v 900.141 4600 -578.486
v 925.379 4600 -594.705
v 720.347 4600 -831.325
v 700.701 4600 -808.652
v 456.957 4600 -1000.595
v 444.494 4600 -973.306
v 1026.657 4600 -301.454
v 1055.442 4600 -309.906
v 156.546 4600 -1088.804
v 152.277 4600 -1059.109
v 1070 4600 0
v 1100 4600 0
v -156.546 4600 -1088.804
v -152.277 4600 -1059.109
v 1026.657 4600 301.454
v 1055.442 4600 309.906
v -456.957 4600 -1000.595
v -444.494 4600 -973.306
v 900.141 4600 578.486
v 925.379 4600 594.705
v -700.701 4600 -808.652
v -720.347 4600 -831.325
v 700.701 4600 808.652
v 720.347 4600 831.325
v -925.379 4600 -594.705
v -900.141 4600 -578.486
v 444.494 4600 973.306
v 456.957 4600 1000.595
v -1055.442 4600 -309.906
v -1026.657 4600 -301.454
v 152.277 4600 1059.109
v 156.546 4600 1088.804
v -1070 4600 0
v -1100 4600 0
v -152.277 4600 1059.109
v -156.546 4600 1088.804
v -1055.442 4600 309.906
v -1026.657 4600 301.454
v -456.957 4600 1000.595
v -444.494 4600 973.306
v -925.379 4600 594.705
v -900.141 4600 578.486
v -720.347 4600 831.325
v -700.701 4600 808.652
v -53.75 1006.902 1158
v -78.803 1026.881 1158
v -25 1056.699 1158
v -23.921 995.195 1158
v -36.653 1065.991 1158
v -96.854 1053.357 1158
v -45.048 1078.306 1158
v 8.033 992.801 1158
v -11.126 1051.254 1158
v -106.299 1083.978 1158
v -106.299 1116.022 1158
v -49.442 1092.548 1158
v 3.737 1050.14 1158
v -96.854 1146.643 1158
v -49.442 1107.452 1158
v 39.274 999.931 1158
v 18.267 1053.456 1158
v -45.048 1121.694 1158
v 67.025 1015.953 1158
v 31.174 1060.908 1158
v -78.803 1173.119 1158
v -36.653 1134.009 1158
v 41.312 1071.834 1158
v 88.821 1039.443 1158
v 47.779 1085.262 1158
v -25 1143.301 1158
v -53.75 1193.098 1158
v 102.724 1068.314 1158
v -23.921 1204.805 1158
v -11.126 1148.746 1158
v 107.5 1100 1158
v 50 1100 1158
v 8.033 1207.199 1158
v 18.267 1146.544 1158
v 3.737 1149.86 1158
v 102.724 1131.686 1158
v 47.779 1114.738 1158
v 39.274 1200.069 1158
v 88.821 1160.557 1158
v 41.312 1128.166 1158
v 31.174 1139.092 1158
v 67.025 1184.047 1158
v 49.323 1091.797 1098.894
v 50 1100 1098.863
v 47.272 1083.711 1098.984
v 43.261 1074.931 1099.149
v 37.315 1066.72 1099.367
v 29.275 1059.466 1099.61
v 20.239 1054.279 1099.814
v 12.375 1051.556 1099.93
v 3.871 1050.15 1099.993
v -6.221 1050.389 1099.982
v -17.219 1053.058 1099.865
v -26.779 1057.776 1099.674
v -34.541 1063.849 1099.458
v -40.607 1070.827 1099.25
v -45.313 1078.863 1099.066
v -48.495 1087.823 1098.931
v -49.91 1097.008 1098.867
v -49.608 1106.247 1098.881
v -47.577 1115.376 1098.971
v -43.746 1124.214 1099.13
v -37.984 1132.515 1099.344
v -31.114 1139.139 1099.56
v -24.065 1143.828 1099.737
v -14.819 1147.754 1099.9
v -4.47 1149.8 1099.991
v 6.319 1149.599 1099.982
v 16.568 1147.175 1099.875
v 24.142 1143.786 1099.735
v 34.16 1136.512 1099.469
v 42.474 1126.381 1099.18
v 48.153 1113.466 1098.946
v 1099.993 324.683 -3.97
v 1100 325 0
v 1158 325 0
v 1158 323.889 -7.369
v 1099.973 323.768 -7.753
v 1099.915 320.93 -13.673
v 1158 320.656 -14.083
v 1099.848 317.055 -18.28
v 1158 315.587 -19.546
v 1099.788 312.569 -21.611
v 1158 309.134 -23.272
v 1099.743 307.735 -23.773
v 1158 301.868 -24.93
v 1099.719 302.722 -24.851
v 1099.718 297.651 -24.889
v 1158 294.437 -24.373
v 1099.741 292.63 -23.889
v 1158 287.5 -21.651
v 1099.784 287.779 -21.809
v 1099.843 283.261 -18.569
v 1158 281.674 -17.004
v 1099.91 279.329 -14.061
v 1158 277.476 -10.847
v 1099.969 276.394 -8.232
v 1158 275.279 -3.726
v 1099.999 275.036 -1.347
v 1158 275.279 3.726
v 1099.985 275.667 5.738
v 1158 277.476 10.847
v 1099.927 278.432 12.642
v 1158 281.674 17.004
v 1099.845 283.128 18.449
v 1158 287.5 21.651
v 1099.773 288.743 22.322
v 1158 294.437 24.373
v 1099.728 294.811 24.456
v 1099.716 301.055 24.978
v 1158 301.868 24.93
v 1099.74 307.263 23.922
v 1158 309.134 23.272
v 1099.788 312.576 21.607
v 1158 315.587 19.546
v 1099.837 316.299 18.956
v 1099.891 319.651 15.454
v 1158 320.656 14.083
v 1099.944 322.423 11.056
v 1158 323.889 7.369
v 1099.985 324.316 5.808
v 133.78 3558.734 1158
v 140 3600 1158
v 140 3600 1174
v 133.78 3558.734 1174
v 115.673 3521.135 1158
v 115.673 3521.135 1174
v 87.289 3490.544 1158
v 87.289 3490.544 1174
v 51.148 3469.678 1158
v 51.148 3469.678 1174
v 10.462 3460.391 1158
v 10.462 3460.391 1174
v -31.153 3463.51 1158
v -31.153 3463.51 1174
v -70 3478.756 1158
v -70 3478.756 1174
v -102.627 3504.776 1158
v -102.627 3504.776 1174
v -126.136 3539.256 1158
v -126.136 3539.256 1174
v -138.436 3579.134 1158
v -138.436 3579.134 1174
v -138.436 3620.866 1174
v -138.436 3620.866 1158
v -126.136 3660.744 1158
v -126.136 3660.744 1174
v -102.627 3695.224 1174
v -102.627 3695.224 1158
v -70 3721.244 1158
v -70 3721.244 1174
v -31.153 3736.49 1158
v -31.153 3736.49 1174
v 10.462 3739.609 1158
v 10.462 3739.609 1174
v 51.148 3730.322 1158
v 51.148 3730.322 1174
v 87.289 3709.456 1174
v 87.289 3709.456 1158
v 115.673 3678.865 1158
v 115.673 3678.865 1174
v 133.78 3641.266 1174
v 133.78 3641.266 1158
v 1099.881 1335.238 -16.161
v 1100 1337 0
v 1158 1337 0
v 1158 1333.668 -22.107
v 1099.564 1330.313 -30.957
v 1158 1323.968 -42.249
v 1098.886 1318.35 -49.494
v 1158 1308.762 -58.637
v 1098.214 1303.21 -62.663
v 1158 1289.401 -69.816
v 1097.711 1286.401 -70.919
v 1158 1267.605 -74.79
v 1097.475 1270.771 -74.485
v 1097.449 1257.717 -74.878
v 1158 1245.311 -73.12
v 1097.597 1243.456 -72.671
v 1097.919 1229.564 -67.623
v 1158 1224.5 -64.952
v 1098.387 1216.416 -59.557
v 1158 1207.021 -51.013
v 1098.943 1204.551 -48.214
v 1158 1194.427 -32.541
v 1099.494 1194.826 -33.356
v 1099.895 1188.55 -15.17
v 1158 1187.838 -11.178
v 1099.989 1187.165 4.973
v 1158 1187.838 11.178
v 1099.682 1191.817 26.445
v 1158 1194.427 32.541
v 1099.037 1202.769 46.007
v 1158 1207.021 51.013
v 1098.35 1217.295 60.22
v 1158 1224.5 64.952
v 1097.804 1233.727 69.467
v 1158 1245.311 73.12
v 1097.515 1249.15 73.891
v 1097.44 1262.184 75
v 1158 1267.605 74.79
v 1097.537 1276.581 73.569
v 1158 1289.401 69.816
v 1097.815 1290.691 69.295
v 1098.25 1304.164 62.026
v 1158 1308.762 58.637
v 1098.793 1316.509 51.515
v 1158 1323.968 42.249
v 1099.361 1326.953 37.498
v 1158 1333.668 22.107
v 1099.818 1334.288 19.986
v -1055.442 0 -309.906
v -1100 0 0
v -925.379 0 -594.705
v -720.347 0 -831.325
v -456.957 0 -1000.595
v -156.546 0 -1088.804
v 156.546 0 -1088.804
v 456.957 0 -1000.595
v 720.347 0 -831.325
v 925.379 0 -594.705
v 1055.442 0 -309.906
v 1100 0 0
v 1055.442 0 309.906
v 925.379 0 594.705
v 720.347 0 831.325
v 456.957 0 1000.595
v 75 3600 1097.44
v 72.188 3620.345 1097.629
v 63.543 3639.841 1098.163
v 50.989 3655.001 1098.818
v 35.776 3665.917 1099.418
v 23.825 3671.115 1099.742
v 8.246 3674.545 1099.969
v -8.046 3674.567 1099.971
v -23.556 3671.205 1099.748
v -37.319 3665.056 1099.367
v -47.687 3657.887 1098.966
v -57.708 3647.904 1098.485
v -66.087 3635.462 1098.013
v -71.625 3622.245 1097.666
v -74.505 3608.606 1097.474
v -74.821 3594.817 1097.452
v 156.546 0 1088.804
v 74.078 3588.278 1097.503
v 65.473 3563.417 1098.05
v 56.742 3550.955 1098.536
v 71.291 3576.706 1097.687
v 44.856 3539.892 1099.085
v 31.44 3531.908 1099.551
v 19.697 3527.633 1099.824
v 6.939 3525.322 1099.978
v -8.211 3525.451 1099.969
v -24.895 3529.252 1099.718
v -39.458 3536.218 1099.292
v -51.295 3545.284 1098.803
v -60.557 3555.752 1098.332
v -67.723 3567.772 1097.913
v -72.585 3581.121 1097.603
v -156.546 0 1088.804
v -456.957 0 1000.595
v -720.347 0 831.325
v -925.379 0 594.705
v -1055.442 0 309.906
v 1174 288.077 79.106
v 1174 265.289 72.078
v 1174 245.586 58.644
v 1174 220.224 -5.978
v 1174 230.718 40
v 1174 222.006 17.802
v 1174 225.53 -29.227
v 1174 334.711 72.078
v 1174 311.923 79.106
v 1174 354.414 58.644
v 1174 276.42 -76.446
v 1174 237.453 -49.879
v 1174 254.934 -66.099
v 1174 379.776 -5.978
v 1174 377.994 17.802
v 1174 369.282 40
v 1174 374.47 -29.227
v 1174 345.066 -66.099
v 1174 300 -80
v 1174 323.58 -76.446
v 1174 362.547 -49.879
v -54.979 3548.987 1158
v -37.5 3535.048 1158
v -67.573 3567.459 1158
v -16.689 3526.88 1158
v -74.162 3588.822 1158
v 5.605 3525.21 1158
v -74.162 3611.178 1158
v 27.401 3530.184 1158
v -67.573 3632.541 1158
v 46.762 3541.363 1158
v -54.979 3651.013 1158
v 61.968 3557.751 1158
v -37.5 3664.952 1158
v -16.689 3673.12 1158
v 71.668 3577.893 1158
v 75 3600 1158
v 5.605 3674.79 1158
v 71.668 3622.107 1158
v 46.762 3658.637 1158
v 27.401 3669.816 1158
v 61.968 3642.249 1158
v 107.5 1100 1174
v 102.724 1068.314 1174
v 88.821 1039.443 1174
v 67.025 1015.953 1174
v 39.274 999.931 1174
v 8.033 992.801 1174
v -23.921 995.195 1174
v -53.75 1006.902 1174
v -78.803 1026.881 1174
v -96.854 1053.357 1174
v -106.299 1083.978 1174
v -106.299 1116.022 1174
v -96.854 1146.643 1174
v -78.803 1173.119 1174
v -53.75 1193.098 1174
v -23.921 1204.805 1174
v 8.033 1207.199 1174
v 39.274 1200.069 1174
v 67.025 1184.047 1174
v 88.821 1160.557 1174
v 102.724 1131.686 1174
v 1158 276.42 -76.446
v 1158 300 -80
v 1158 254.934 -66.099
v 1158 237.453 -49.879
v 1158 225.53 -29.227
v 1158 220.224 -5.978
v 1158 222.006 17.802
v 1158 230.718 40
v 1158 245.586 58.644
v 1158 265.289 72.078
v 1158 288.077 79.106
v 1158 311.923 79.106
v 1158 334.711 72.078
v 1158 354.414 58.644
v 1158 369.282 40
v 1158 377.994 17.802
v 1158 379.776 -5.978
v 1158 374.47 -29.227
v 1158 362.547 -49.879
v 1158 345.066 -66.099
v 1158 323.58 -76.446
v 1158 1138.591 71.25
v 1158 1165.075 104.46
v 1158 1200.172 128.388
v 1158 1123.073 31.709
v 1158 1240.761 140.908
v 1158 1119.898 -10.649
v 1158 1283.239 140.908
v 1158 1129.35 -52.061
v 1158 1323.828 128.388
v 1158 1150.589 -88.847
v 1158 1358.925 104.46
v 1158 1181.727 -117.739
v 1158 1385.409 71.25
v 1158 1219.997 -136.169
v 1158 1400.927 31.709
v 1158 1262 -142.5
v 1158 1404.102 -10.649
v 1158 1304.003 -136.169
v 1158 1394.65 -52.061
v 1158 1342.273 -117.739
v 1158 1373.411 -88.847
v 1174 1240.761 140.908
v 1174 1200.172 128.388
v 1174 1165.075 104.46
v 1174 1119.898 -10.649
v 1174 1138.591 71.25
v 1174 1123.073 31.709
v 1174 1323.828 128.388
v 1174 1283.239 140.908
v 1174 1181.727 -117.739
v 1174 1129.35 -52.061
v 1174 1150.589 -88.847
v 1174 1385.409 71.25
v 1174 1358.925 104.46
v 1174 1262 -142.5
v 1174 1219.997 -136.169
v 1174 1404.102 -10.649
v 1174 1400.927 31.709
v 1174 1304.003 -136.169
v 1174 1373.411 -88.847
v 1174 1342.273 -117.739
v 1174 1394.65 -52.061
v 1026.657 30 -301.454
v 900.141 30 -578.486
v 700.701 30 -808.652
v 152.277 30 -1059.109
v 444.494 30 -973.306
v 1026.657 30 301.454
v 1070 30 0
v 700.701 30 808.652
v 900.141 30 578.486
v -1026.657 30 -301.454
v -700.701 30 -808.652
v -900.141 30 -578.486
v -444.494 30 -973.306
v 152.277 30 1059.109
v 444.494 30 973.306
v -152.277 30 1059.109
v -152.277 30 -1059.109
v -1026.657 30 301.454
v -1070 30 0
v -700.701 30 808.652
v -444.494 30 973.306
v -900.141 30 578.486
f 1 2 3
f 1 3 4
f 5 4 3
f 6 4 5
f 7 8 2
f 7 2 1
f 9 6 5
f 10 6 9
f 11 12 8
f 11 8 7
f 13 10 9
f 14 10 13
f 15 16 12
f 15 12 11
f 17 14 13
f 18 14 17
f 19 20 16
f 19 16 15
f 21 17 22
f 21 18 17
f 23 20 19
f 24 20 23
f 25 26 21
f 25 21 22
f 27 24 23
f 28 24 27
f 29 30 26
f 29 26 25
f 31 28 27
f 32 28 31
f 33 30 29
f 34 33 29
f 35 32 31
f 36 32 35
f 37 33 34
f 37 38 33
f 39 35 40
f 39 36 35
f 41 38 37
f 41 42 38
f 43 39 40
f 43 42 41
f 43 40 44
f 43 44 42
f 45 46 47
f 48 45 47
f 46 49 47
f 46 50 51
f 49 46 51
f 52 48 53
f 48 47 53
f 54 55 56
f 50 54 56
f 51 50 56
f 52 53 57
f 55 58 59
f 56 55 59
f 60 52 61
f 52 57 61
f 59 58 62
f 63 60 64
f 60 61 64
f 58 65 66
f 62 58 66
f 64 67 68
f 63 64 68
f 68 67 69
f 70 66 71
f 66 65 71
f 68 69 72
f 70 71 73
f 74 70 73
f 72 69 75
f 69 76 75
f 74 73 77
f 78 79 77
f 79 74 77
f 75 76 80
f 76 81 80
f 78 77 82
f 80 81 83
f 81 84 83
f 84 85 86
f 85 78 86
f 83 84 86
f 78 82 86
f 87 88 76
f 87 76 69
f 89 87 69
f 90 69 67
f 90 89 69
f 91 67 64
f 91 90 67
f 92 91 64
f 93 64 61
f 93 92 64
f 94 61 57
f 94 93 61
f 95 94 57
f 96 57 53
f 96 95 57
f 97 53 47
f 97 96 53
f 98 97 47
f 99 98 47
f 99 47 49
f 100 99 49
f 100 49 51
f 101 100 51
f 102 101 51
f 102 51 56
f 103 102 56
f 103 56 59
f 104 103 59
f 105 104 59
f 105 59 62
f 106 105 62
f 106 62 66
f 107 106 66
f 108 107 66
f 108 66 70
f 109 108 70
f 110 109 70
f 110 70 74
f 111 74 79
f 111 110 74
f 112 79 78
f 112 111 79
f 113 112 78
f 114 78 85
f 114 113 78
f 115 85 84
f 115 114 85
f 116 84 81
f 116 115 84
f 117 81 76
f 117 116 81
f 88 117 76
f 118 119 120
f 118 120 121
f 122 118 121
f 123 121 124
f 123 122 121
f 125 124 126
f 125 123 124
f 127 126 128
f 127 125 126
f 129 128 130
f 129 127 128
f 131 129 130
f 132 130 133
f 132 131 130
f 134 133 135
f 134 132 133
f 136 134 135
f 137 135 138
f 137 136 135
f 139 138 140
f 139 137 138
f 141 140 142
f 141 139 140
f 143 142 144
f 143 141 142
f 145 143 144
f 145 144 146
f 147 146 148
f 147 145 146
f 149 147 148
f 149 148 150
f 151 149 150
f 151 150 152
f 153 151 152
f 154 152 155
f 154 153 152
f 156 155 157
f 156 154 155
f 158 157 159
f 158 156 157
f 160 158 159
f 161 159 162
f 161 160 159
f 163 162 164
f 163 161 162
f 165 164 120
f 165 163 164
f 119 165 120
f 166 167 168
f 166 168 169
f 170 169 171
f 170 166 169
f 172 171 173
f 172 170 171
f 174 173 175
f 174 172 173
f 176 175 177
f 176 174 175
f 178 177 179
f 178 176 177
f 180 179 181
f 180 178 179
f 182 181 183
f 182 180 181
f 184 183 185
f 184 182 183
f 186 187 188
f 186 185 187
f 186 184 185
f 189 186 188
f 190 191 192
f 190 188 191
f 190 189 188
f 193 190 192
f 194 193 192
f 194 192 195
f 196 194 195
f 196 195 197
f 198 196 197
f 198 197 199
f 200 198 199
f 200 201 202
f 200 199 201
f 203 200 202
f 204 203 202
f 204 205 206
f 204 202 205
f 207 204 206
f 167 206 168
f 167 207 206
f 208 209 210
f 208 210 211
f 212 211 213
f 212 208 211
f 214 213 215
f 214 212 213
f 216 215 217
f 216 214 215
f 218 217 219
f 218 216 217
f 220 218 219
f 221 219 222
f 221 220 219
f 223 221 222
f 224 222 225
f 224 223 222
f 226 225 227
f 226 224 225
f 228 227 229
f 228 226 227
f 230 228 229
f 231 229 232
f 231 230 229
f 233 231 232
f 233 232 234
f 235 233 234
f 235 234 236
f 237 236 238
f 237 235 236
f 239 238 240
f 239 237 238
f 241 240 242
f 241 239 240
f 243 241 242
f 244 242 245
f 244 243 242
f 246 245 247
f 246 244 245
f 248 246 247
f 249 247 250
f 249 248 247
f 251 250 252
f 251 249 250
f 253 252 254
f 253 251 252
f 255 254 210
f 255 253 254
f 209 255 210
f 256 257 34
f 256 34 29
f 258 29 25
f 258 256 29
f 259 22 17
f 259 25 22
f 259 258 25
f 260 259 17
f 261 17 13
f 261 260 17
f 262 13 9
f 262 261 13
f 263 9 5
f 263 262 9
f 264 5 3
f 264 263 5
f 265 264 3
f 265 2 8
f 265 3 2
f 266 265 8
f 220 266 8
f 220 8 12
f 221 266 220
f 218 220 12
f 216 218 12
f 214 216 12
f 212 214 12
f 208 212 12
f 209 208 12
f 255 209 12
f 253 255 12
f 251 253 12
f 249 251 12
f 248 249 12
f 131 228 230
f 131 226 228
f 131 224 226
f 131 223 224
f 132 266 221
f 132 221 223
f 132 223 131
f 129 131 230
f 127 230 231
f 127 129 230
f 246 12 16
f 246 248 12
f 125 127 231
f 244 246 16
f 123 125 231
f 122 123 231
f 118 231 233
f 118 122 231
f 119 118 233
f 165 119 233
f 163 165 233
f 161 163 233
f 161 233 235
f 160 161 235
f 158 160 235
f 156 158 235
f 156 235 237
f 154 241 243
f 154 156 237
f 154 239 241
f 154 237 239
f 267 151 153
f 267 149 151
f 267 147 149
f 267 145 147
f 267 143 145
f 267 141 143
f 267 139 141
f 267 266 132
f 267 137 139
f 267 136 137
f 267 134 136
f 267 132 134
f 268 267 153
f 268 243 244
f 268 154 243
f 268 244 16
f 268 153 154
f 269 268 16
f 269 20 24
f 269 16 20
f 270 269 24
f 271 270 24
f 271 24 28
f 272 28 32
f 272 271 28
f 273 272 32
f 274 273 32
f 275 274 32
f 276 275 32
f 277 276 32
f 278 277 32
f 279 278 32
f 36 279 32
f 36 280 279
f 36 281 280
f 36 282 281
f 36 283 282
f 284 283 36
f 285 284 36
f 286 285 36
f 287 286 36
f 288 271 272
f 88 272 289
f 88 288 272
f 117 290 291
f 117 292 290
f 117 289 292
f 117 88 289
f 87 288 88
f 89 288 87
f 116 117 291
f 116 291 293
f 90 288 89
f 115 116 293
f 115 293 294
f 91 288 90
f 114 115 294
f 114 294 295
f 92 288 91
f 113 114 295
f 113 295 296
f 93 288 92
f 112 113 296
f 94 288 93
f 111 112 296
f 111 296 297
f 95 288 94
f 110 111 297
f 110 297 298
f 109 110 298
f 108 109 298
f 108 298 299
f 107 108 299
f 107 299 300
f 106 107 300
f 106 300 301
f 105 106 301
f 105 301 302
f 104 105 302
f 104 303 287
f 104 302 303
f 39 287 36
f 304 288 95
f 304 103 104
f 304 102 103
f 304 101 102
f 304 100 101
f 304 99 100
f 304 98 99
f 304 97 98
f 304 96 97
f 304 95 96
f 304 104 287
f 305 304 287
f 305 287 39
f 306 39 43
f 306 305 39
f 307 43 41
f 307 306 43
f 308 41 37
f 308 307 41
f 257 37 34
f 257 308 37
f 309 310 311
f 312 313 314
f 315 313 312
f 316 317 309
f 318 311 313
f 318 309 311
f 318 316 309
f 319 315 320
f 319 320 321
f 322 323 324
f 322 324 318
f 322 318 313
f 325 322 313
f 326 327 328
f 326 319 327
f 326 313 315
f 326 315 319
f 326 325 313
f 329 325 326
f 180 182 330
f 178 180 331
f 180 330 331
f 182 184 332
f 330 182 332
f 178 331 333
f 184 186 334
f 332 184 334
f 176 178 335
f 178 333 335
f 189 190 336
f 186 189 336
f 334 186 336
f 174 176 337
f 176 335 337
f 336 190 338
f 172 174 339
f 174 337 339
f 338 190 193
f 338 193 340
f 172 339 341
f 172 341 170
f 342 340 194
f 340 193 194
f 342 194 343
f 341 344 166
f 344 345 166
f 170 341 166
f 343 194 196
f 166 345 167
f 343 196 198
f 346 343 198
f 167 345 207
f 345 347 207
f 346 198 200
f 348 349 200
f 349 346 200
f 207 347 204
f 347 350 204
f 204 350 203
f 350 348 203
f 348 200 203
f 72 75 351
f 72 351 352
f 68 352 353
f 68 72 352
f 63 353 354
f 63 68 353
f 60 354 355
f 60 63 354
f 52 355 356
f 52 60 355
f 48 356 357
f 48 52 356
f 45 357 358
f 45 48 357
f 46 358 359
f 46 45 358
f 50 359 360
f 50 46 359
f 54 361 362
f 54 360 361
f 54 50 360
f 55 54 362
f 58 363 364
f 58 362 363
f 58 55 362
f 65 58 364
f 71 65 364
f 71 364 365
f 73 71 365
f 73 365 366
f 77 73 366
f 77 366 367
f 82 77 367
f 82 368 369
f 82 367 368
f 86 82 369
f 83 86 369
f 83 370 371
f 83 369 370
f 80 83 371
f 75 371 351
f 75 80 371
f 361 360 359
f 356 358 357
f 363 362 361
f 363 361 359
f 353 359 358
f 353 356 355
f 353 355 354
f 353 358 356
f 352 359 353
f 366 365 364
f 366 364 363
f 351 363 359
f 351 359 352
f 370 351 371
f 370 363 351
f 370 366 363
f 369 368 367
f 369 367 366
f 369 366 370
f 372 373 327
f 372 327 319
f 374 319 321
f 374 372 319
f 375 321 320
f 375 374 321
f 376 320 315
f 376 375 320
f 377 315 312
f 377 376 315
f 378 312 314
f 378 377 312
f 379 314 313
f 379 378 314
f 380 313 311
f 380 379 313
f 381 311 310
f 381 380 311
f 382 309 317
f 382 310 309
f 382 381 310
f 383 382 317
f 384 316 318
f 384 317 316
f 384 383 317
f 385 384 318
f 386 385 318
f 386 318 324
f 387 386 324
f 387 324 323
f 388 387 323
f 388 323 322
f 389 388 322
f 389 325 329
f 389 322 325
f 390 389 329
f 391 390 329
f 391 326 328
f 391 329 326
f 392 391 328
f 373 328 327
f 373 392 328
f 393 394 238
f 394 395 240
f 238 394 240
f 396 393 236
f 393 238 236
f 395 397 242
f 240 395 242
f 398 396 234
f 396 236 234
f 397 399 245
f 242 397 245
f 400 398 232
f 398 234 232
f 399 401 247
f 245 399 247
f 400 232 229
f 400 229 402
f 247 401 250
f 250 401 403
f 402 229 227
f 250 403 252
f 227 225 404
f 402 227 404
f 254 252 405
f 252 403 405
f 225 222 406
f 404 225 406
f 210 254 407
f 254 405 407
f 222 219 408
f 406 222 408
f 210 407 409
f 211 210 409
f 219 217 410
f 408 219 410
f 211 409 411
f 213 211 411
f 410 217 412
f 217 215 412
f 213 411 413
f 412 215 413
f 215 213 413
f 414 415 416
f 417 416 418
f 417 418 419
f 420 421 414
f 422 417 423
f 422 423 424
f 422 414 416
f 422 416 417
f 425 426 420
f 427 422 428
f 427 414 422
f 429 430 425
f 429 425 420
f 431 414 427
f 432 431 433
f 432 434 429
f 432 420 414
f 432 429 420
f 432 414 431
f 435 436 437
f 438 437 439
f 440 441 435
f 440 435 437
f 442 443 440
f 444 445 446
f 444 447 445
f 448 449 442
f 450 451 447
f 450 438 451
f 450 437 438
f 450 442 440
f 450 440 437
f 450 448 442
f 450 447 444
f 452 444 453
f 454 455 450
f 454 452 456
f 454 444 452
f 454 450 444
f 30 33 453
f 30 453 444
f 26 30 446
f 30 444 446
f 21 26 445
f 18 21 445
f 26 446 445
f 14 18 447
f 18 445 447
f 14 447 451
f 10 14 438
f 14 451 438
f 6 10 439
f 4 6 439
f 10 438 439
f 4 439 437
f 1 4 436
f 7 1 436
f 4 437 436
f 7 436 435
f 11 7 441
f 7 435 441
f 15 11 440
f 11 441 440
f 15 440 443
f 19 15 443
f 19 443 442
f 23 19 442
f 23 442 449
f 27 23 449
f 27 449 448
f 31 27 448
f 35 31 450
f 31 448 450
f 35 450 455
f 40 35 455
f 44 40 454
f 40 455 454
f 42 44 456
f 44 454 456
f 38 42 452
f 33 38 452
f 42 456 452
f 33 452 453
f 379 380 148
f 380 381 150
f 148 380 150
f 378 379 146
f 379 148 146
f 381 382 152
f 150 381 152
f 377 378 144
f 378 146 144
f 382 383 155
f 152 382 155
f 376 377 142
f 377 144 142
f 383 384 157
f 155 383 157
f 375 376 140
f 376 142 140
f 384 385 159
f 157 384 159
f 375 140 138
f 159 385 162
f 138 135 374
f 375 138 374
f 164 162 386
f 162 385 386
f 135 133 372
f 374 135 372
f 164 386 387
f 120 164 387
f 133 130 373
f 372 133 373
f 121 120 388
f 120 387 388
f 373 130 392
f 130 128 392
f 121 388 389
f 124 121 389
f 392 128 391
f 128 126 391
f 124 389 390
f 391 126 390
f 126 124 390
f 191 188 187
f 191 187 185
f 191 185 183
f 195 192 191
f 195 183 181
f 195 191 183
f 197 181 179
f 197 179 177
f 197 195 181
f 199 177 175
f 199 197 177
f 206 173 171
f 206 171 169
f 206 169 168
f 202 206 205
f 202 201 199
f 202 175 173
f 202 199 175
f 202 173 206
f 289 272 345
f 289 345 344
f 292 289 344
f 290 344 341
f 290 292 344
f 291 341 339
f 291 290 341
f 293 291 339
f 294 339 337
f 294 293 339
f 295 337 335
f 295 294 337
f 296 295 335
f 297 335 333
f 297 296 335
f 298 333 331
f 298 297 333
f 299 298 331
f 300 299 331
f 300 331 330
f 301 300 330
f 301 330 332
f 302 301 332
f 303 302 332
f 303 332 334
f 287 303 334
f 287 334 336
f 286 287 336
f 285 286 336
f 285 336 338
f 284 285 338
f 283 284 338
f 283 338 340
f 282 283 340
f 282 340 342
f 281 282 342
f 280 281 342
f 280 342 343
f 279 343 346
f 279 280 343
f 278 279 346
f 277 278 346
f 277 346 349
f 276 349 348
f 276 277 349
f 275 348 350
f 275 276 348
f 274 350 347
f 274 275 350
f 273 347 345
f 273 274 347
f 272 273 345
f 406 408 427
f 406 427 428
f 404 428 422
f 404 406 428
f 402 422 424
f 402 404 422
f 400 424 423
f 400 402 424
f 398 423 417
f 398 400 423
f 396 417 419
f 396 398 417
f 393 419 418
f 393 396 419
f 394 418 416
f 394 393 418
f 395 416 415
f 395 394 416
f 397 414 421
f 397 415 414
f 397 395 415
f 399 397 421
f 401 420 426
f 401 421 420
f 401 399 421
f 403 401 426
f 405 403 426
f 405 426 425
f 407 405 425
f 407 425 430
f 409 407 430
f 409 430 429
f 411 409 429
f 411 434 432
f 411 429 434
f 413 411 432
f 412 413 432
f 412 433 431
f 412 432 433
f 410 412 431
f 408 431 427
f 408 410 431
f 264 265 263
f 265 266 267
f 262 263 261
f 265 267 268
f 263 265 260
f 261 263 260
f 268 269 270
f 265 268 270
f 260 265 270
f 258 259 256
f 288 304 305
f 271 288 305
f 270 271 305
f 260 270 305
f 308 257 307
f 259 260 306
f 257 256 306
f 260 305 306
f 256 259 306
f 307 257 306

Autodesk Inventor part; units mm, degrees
ref_plane "XZ Plane" through (0, 0, 0) normal (0, 1, 0) x (-1, 0, 0)
sketch "Sketch1" plane through (0, 0, 0) normal (0, 1, 0) x (-1, 0, 0)
  circle A0 centre (0, 0) radius 1100
  dimension "d0" = 2200
extrude "Extrusion1" add sketch "Sketch1" along normal blind 4600
shell "Shell1" thickness 30 removed faces 1 at (308.7984, 4600, -93.6109)
ref_plane "Work Plane1" through (0, 0, 1085) normal (0, 0, 1) x (1, 0, 0)
sketch "Sketch2" plane through (0, 0, 1085) normal (0, 0, 1) x (1, 0, 0)
  circle A0 centre (0, 1100) radius 50
  line L0 (1100, 0) -> (-1100, 0) projected
  point P0 (0, 0)
  point P1 (0, 0)
  dimension "d5" = 100
  dimension "d7" = 1100
extrude "Extrusion2" add sketch "Sketch2" along normal blind 73
sketch "Sketch4" plane through (0, 0, 1085) normal (0, 0, 1) x (1, 0, 0)
  circle A0 centre (0, 3600) radius 75
  point P0 (0, 0)
  dimension "d12" = 150
  dimension "d13" = 3600
extrude "Extrusion3" add sketch "Sketch4" along normal blind 73
ref_plane "Work Plane3" through (1085, 0, 0) normal (1, 0, 0) x (0, 1, 0)
sketch "Sketch5" plane through (1085, 0, 0) normal (1, 0, 0) x (0, 1, 0)
  circle A0 centre (1262, 0) radius 75
  point P0 (0, 0)
  dimension "d17" = 150
  dimension "d18" = 1262
extrude "Extrusion4" add sketch "Sketch5" along normal blind 73
sketch "Sketch9" plane through (1085, 0, 0) normal (1, 0, 0) x (0, 1, 0)
  circle A0 centre (300, 0) radius 25
  point P0 (0, 0)
  dimension "d30" = 50
  dimension "d31" = 300
extrude "Extrusion8" add sketch "Sketch9" along normal blind 73
sketch "Sketch8" plane through (0, 1100, 1158) normal (0, 0, 1) x (1, 0, 0)
  circle A0 centre (0, 0) radius 50 projected
  circle A1 centre (0, 0) radius 107.5
  point P0 (0, -1100)
  dimension "d27" = 215
extrude "Extrusion7" add sketch "Sketch8" along normal blind 16 contours A0 | A1
sketch "Sketch7" plane through (0, 3600, 1158) normal (0, 0, 1) x (1, 0, 0)
  circle A0 centre (0, 0) radius 75 projected
  circle A1 centre (0, 0) radius 140
  point P0 (0, -3600)
  dimension "d24" = 280
extrude "Extrusion6" add sketch "Sketch7" along normal blind 16 contours A0 | A1
sketch "Sketch10" plane through (1158, 300, 0) normal (1, 0, 0) x (0, 0, -1)
  circle A0 centre (0, 0) radius 25 projected
  circle A1 centre (0, 0) radius 80
  point P0 (0, -300)
  dimension "d34" = 160
extrude "Extrusion9" add sketch "Sketch10" along normal blind 16 contours A0 | A1
sketch "Sketch6" plane through (1158, 1262, 0) normal (1, 0, 0) x (0, 0, -1)
  circle A0 centre (0, 0) radius 142.5
  circle A1 centre (0, 0) radius 75 projected
  point P0 (0, -1262)
  dimension "d21" = 285
extrude "Extrusion5" add sketch "Sketch6" along normal blind 16 contours A0 | A1
properties part number "Резервуар сбора осветленной воды"
